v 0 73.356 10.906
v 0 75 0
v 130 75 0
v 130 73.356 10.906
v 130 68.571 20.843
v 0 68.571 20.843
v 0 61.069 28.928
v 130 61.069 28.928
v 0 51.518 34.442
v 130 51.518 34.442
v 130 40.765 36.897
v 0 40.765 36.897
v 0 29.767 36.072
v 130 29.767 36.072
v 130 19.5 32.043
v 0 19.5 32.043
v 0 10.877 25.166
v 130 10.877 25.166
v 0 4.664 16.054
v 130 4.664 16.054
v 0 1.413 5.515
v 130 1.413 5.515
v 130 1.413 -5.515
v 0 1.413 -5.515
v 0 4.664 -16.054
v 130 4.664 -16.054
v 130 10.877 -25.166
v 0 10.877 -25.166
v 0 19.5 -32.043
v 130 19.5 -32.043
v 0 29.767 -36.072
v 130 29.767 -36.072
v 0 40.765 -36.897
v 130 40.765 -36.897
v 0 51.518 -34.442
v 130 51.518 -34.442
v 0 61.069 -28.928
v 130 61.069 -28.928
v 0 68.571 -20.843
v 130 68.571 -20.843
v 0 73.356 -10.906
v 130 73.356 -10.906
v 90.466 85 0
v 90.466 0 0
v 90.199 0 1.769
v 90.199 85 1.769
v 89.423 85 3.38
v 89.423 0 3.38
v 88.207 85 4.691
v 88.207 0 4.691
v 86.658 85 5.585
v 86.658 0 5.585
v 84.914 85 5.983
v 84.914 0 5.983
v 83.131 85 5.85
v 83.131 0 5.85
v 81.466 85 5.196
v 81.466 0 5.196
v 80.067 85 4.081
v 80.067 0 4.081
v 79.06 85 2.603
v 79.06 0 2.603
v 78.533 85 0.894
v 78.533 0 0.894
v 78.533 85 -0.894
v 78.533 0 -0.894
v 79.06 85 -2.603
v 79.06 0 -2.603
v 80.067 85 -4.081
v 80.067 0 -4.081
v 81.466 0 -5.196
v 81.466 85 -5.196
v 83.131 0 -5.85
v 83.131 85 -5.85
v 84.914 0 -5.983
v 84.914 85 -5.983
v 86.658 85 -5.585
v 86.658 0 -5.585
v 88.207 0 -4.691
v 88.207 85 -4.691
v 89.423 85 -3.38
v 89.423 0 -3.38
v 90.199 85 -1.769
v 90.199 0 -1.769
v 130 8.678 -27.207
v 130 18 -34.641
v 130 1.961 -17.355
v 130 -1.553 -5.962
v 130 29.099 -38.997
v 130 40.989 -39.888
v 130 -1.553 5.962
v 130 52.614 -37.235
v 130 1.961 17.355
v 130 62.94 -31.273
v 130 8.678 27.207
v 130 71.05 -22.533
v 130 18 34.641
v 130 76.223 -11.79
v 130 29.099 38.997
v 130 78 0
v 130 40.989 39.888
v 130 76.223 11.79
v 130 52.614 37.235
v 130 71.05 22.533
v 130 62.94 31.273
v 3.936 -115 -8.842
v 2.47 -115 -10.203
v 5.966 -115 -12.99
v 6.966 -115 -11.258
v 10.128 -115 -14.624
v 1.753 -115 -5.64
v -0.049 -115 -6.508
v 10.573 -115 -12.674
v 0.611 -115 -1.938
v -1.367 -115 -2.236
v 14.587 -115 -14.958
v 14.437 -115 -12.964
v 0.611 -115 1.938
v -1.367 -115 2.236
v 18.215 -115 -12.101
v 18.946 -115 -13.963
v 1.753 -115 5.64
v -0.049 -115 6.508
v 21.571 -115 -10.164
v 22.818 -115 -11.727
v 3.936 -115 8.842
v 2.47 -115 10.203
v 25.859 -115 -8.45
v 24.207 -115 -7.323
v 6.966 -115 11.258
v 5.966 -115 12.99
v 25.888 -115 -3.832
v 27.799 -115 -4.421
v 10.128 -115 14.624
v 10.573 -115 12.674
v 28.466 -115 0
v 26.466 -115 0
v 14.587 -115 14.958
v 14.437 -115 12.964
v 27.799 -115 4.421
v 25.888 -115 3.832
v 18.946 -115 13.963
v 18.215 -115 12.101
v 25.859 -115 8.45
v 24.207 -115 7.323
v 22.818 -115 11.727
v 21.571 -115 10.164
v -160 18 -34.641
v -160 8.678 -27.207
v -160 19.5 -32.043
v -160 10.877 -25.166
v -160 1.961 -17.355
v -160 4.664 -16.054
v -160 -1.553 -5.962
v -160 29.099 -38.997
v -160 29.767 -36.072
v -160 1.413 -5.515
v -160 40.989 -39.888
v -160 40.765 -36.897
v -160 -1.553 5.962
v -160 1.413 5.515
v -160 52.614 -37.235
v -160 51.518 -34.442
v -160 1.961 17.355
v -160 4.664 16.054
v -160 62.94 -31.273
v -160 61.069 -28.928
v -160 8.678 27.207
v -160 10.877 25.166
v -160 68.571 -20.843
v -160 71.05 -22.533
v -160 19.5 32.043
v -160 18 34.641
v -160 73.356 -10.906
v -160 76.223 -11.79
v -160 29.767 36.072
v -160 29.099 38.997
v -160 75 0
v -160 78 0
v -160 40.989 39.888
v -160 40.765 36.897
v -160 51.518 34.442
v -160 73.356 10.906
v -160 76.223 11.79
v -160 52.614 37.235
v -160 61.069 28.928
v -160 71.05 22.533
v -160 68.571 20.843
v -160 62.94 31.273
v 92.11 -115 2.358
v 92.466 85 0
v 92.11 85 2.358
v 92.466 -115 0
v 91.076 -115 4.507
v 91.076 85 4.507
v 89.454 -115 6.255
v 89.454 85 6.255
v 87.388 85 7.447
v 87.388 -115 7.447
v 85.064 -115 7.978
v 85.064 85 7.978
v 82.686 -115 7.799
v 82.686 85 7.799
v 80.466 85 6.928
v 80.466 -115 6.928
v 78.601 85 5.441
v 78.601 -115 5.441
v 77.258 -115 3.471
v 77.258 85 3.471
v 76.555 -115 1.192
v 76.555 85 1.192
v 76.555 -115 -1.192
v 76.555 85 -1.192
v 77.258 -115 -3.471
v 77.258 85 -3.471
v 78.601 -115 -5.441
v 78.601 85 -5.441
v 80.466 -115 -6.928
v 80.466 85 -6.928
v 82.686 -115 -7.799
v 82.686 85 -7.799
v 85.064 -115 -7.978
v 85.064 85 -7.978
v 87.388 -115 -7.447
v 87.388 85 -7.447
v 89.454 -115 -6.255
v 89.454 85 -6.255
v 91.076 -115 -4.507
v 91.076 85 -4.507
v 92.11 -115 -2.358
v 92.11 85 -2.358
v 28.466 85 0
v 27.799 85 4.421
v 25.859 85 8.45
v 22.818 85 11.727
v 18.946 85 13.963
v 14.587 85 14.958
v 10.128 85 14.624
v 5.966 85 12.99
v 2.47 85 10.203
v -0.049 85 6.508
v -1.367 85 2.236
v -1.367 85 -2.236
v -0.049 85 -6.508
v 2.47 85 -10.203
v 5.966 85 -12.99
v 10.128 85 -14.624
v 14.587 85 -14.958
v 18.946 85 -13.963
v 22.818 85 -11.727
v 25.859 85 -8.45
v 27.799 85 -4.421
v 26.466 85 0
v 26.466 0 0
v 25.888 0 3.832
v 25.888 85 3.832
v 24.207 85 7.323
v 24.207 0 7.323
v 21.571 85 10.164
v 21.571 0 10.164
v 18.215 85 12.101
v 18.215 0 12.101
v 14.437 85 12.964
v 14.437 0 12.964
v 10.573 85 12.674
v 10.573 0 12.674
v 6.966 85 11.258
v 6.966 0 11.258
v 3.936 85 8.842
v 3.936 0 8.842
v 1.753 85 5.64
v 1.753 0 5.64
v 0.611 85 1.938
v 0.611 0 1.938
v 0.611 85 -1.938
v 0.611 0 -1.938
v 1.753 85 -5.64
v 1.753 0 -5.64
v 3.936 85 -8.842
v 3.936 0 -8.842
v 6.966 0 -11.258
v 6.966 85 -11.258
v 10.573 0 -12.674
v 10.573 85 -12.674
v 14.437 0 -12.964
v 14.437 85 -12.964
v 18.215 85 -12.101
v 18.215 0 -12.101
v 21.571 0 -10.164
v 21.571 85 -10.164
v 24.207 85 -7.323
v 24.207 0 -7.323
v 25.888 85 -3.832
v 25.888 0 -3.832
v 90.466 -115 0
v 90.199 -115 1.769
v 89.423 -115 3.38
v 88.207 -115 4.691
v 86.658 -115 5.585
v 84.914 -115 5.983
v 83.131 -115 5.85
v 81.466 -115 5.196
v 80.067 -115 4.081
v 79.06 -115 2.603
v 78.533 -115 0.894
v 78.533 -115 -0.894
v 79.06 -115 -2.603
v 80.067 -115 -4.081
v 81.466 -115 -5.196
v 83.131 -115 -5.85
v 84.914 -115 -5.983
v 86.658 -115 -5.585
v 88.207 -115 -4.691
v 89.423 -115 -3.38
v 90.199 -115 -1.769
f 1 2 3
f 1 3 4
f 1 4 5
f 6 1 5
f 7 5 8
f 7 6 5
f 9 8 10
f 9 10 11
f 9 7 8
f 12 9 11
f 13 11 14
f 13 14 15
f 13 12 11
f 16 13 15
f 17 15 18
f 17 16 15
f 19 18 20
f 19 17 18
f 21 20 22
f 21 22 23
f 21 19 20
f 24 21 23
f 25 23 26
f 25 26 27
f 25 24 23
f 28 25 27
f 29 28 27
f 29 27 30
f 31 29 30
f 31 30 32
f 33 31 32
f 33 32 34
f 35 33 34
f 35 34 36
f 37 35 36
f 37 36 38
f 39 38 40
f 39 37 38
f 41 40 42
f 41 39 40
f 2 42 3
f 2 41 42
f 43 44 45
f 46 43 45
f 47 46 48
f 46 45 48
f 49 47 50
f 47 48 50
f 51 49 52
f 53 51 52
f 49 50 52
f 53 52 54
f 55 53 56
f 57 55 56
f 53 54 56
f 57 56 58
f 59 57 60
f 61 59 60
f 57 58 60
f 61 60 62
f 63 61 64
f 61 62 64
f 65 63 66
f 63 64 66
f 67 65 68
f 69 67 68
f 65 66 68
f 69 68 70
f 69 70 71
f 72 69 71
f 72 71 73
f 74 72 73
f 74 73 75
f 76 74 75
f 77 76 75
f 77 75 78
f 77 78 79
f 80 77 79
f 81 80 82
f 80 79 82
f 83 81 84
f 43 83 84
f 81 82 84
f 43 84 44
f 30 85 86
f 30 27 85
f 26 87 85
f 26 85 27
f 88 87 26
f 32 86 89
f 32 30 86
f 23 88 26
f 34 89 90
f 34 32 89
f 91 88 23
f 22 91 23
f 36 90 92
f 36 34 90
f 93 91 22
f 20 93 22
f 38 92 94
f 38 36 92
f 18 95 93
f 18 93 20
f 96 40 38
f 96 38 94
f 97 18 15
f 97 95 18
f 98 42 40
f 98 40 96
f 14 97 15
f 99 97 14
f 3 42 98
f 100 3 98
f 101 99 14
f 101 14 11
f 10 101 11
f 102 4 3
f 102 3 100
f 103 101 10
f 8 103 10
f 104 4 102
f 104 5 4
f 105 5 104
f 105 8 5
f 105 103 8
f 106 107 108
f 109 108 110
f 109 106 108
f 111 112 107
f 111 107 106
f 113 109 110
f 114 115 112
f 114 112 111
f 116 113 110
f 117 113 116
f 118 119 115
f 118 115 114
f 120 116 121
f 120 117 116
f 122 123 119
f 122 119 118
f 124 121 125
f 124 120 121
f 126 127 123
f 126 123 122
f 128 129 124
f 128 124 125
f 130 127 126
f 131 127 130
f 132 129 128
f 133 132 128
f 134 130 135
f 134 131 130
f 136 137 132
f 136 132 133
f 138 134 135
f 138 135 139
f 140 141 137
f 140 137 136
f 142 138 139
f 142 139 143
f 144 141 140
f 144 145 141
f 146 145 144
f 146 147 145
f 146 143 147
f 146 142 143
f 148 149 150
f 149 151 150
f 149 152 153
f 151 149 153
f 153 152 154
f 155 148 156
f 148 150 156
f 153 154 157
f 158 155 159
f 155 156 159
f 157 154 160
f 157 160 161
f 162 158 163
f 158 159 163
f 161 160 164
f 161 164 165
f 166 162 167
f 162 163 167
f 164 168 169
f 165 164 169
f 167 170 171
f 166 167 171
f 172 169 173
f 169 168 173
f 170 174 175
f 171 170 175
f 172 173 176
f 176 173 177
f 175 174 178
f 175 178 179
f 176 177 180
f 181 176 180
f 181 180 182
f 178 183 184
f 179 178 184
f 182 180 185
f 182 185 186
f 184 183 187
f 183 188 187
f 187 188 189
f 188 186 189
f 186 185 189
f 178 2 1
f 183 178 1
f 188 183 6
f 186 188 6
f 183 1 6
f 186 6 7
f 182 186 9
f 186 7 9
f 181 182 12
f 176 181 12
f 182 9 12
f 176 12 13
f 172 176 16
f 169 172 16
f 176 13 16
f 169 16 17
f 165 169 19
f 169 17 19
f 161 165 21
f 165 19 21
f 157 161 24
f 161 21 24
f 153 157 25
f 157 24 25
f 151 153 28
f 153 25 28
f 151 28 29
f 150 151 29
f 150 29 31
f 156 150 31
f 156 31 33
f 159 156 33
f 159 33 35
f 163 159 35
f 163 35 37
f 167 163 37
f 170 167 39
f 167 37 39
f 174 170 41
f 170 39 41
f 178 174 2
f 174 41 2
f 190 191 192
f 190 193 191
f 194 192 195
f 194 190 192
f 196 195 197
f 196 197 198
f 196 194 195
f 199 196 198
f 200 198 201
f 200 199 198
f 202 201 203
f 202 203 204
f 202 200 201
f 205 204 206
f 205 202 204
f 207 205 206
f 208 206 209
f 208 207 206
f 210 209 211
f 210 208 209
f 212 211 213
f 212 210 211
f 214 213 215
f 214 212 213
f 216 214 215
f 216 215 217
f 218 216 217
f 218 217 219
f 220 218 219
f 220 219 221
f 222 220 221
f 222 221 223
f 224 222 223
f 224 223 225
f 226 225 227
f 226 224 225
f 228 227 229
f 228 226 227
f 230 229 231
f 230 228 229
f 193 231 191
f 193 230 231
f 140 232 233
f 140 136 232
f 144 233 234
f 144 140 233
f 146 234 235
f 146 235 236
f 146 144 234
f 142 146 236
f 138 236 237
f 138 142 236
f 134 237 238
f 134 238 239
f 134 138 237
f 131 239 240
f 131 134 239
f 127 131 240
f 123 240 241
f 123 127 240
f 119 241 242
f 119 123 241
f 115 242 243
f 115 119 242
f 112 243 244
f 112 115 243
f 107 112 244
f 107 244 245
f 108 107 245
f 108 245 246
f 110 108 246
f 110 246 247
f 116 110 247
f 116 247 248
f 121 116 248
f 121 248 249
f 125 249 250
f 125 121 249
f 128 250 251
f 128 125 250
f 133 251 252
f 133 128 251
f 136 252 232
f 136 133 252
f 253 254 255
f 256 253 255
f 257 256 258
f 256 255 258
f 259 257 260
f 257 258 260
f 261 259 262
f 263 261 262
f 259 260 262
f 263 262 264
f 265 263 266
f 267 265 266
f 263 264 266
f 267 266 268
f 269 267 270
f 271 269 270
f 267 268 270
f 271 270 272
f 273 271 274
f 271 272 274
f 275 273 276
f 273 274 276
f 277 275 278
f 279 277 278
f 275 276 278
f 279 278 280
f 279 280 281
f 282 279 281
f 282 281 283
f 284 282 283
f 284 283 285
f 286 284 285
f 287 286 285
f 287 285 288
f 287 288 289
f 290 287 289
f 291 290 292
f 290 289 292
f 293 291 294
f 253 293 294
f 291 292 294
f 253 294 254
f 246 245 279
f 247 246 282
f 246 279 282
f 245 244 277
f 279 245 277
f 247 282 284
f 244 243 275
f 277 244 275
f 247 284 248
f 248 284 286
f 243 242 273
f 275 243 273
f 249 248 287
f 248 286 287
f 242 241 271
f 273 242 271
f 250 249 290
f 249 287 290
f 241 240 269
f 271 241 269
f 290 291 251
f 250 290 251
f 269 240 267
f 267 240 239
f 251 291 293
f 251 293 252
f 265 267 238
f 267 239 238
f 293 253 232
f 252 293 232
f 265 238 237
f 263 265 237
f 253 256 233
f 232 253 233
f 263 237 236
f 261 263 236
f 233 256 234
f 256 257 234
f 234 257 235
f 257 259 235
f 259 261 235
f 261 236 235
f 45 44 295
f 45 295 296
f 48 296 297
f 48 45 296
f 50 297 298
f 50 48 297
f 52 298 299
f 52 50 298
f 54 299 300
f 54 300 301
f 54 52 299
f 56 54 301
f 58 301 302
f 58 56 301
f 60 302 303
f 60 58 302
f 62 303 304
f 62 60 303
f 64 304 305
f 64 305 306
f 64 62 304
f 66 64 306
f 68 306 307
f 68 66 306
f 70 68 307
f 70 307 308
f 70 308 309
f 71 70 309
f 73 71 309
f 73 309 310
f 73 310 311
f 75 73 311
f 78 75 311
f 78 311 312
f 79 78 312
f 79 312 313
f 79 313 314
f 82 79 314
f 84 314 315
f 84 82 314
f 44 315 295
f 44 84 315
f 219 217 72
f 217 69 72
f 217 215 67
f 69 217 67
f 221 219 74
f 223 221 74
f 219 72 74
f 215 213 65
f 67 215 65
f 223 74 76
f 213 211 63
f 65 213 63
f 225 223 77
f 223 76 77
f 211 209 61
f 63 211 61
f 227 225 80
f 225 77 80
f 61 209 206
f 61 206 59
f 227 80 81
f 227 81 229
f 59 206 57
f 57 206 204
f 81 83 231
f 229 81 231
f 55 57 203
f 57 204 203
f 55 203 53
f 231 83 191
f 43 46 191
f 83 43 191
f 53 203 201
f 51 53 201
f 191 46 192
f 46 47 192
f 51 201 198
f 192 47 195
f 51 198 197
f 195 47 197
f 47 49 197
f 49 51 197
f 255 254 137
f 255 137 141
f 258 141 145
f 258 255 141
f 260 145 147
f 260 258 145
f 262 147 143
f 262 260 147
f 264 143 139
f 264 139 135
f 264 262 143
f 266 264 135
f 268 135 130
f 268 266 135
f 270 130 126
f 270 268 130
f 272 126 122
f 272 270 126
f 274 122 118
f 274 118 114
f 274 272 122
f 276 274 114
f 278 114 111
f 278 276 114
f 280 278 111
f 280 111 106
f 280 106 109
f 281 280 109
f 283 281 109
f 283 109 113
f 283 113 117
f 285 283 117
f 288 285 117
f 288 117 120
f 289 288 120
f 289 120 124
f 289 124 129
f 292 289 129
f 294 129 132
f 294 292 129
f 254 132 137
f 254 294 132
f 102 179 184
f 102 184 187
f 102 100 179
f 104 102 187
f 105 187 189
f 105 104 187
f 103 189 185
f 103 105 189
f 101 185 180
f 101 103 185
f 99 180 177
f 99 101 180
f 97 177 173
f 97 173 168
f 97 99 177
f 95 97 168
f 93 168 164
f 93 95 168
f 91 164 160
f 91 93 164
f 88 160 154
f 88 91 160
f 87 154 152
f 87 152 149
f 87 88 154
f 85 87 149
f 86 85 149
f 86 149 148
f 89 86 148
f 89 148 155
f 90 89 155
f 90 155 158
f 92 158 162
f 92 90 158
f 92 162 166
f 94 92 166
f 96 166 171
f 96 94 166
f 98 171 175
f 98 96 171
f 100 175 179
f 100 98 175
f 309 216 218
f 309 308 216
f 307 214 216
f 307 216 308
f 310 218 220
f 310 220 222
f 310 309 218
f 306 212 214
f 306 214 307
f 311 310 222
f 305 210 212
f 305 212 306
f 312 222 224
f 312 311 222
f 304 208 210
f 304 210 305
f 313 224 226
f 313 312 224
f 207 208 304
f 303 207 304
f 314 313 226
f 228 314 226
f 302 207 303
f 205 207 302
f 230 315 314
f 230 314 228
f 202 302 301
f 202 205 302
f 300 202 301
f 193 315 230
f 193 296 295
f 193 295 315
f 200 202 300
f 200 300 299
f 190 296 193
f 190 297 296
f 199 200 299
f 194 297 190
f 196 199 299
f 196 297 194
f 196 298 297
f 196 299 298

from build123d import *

# Parameters (mm, degrees)
F1_R          = 15
F1_R_2        = 13
F2_DEPTH      = 115
F2_DEPTH_BACK = 85
F1_R_3        = 8
F1_R_4        = 6
F3_DEPTH      = 115
F3_DEPTH_BACK = 85
F5_R          = 40
F5_R_2        = 37
F6_DEPTH      = 130
F6_DEPTH_BACK = 160


with BuildPart() as f2:
    # F1 (on Front) → F2 (new body, two sides)
    with BuildSketch(Plane.XZ) as f2_sk:
        with Locations((13.4657353163, 0)):
            Circle(F1_R)
        with Locations((13.4657353163, 0)):
            Circle(F1_R_2, mode=Mode.SUBTRACT)
    extrude(amount=F2_DEPTH)
    extrude(f2_sk.sketch, amount=-F2_DEPTH_BACK)


with BuildPart() as f3:
    # F1 (on Front) → F3 (new body, two sides)
    with BuildSketch(Plane.XZ) as f3_sk:
        with Locations((84.4657353163, 0)):
            Circle(F1_R_3)
        with Locations((84.4657353163, 0)):
            Circle(F1_R_4, mode=Mode.SUBTRACT)
    extrude(amount=F3_DEPTH)
    extrude(f3_sk.sketch, amount=-F3_DEPTH_BACK)


with BuildPart() as f6:
    # F5 (on Right) → F6 (new body, two sides)
    with BuildSketch(Plane.YZ) as f6_sk:
        with Locations((38, 0)):
            Circle(F5_R)
        with Locations((38, 0)):
            Circle(F5_R_2, mode=Mode.SUBTRACT)
    extrude(amount=F6_DEPTH)
    extrude(f6_sk.sketch, amount=-F6_DEPTH_BACK)


solid = Compound([f2.part, f3.part, f6.part])
